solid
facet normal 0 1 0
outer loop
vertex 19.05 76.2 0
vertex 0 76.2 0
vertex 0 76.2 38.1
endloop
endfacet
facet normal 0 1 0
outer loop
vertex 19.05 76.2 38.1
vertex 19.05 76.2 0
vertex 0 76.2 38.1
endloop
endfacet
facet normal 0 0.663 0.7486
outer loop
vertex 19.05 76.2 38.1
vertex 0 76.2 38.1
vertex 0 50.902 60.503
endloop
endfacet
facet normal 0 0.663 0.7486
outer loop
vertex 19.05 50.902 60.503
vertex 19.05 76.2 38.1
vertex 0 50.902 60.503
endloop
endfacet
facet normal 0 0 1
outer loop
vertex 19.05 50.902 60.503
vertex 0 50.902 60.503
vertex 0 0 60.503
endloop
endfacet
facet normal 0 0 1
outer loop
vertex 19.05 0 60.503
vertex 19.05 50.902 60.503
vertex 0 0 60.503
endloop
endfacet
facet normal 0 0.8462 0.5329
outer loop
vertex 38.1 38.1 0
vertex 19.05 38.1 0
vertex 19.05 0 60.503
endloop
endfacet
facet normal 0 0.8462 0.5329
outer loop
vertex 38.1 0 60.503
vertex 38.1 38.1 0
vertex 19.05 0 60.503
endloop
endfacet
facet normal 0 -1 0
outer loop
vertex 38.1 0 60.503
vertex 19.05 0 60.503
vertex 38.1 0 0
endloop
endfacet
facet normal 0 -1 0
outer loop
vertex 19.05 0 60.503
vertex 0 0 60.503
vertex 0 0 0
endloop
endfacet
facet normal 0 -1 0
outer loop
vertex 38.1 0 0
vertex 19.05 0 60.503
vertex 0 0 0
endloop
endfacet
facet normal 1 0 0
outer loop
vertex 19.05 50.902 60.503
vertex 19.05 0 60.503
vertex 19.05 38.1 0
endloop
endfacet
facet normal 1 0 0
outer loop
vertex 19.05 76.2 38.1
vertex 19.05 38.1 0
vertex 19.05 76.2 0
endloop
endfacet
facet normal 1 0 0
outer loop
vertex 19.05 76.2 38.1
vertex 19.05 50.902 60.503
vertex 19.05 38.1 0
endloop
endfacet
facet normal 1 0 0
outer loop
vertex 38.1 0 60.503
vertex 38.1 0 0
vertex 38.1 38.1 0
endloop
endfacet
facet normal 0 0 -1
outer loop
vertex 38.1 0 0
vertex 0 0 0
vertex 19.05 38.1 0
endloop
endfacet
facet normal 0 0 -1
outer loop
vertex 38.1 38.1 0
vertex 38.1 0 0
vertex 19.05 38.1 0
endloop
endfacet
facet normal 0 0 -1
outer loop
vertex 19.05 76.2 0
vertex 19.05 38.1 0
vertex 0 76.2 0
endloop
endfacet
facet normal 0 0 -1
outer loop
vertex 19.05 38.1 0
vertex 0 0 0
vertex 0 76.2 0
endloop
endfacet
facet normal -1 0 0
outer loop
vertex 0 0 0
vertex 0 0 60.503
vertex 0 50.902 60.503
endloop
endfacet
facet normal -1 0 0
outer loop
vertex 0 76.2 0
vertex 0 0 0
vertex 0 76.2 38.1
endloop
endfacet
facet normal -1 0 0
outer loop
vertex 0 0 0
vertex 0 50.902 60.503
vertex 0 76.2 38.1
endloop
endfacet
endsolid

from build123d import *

# Parameters (mm, degrees)
F1_DEPTH = 19.05
F3_DEPTH = 19.05


with BuildPart() as f1:
    # F0 (on Right) → F1 (new body)
    with BuildSketch(Plane.YZ):
        Polygon((0, 60.502801), (0, 0), (76.2, 0), (76.2, 38.1), (50.901599, 60.502801), align=None)
    extrude(amount=F1_DEPTH)

    # F2 (on face) → F3 (join)
    with BuildSketch(Plane.YZ.offset(19.05)):
        Polygon((0, 0), (38.1, 0), (0, 60.502801), align=None)
    extrude(amount=F3_DEPTH)


solid = f1.part
